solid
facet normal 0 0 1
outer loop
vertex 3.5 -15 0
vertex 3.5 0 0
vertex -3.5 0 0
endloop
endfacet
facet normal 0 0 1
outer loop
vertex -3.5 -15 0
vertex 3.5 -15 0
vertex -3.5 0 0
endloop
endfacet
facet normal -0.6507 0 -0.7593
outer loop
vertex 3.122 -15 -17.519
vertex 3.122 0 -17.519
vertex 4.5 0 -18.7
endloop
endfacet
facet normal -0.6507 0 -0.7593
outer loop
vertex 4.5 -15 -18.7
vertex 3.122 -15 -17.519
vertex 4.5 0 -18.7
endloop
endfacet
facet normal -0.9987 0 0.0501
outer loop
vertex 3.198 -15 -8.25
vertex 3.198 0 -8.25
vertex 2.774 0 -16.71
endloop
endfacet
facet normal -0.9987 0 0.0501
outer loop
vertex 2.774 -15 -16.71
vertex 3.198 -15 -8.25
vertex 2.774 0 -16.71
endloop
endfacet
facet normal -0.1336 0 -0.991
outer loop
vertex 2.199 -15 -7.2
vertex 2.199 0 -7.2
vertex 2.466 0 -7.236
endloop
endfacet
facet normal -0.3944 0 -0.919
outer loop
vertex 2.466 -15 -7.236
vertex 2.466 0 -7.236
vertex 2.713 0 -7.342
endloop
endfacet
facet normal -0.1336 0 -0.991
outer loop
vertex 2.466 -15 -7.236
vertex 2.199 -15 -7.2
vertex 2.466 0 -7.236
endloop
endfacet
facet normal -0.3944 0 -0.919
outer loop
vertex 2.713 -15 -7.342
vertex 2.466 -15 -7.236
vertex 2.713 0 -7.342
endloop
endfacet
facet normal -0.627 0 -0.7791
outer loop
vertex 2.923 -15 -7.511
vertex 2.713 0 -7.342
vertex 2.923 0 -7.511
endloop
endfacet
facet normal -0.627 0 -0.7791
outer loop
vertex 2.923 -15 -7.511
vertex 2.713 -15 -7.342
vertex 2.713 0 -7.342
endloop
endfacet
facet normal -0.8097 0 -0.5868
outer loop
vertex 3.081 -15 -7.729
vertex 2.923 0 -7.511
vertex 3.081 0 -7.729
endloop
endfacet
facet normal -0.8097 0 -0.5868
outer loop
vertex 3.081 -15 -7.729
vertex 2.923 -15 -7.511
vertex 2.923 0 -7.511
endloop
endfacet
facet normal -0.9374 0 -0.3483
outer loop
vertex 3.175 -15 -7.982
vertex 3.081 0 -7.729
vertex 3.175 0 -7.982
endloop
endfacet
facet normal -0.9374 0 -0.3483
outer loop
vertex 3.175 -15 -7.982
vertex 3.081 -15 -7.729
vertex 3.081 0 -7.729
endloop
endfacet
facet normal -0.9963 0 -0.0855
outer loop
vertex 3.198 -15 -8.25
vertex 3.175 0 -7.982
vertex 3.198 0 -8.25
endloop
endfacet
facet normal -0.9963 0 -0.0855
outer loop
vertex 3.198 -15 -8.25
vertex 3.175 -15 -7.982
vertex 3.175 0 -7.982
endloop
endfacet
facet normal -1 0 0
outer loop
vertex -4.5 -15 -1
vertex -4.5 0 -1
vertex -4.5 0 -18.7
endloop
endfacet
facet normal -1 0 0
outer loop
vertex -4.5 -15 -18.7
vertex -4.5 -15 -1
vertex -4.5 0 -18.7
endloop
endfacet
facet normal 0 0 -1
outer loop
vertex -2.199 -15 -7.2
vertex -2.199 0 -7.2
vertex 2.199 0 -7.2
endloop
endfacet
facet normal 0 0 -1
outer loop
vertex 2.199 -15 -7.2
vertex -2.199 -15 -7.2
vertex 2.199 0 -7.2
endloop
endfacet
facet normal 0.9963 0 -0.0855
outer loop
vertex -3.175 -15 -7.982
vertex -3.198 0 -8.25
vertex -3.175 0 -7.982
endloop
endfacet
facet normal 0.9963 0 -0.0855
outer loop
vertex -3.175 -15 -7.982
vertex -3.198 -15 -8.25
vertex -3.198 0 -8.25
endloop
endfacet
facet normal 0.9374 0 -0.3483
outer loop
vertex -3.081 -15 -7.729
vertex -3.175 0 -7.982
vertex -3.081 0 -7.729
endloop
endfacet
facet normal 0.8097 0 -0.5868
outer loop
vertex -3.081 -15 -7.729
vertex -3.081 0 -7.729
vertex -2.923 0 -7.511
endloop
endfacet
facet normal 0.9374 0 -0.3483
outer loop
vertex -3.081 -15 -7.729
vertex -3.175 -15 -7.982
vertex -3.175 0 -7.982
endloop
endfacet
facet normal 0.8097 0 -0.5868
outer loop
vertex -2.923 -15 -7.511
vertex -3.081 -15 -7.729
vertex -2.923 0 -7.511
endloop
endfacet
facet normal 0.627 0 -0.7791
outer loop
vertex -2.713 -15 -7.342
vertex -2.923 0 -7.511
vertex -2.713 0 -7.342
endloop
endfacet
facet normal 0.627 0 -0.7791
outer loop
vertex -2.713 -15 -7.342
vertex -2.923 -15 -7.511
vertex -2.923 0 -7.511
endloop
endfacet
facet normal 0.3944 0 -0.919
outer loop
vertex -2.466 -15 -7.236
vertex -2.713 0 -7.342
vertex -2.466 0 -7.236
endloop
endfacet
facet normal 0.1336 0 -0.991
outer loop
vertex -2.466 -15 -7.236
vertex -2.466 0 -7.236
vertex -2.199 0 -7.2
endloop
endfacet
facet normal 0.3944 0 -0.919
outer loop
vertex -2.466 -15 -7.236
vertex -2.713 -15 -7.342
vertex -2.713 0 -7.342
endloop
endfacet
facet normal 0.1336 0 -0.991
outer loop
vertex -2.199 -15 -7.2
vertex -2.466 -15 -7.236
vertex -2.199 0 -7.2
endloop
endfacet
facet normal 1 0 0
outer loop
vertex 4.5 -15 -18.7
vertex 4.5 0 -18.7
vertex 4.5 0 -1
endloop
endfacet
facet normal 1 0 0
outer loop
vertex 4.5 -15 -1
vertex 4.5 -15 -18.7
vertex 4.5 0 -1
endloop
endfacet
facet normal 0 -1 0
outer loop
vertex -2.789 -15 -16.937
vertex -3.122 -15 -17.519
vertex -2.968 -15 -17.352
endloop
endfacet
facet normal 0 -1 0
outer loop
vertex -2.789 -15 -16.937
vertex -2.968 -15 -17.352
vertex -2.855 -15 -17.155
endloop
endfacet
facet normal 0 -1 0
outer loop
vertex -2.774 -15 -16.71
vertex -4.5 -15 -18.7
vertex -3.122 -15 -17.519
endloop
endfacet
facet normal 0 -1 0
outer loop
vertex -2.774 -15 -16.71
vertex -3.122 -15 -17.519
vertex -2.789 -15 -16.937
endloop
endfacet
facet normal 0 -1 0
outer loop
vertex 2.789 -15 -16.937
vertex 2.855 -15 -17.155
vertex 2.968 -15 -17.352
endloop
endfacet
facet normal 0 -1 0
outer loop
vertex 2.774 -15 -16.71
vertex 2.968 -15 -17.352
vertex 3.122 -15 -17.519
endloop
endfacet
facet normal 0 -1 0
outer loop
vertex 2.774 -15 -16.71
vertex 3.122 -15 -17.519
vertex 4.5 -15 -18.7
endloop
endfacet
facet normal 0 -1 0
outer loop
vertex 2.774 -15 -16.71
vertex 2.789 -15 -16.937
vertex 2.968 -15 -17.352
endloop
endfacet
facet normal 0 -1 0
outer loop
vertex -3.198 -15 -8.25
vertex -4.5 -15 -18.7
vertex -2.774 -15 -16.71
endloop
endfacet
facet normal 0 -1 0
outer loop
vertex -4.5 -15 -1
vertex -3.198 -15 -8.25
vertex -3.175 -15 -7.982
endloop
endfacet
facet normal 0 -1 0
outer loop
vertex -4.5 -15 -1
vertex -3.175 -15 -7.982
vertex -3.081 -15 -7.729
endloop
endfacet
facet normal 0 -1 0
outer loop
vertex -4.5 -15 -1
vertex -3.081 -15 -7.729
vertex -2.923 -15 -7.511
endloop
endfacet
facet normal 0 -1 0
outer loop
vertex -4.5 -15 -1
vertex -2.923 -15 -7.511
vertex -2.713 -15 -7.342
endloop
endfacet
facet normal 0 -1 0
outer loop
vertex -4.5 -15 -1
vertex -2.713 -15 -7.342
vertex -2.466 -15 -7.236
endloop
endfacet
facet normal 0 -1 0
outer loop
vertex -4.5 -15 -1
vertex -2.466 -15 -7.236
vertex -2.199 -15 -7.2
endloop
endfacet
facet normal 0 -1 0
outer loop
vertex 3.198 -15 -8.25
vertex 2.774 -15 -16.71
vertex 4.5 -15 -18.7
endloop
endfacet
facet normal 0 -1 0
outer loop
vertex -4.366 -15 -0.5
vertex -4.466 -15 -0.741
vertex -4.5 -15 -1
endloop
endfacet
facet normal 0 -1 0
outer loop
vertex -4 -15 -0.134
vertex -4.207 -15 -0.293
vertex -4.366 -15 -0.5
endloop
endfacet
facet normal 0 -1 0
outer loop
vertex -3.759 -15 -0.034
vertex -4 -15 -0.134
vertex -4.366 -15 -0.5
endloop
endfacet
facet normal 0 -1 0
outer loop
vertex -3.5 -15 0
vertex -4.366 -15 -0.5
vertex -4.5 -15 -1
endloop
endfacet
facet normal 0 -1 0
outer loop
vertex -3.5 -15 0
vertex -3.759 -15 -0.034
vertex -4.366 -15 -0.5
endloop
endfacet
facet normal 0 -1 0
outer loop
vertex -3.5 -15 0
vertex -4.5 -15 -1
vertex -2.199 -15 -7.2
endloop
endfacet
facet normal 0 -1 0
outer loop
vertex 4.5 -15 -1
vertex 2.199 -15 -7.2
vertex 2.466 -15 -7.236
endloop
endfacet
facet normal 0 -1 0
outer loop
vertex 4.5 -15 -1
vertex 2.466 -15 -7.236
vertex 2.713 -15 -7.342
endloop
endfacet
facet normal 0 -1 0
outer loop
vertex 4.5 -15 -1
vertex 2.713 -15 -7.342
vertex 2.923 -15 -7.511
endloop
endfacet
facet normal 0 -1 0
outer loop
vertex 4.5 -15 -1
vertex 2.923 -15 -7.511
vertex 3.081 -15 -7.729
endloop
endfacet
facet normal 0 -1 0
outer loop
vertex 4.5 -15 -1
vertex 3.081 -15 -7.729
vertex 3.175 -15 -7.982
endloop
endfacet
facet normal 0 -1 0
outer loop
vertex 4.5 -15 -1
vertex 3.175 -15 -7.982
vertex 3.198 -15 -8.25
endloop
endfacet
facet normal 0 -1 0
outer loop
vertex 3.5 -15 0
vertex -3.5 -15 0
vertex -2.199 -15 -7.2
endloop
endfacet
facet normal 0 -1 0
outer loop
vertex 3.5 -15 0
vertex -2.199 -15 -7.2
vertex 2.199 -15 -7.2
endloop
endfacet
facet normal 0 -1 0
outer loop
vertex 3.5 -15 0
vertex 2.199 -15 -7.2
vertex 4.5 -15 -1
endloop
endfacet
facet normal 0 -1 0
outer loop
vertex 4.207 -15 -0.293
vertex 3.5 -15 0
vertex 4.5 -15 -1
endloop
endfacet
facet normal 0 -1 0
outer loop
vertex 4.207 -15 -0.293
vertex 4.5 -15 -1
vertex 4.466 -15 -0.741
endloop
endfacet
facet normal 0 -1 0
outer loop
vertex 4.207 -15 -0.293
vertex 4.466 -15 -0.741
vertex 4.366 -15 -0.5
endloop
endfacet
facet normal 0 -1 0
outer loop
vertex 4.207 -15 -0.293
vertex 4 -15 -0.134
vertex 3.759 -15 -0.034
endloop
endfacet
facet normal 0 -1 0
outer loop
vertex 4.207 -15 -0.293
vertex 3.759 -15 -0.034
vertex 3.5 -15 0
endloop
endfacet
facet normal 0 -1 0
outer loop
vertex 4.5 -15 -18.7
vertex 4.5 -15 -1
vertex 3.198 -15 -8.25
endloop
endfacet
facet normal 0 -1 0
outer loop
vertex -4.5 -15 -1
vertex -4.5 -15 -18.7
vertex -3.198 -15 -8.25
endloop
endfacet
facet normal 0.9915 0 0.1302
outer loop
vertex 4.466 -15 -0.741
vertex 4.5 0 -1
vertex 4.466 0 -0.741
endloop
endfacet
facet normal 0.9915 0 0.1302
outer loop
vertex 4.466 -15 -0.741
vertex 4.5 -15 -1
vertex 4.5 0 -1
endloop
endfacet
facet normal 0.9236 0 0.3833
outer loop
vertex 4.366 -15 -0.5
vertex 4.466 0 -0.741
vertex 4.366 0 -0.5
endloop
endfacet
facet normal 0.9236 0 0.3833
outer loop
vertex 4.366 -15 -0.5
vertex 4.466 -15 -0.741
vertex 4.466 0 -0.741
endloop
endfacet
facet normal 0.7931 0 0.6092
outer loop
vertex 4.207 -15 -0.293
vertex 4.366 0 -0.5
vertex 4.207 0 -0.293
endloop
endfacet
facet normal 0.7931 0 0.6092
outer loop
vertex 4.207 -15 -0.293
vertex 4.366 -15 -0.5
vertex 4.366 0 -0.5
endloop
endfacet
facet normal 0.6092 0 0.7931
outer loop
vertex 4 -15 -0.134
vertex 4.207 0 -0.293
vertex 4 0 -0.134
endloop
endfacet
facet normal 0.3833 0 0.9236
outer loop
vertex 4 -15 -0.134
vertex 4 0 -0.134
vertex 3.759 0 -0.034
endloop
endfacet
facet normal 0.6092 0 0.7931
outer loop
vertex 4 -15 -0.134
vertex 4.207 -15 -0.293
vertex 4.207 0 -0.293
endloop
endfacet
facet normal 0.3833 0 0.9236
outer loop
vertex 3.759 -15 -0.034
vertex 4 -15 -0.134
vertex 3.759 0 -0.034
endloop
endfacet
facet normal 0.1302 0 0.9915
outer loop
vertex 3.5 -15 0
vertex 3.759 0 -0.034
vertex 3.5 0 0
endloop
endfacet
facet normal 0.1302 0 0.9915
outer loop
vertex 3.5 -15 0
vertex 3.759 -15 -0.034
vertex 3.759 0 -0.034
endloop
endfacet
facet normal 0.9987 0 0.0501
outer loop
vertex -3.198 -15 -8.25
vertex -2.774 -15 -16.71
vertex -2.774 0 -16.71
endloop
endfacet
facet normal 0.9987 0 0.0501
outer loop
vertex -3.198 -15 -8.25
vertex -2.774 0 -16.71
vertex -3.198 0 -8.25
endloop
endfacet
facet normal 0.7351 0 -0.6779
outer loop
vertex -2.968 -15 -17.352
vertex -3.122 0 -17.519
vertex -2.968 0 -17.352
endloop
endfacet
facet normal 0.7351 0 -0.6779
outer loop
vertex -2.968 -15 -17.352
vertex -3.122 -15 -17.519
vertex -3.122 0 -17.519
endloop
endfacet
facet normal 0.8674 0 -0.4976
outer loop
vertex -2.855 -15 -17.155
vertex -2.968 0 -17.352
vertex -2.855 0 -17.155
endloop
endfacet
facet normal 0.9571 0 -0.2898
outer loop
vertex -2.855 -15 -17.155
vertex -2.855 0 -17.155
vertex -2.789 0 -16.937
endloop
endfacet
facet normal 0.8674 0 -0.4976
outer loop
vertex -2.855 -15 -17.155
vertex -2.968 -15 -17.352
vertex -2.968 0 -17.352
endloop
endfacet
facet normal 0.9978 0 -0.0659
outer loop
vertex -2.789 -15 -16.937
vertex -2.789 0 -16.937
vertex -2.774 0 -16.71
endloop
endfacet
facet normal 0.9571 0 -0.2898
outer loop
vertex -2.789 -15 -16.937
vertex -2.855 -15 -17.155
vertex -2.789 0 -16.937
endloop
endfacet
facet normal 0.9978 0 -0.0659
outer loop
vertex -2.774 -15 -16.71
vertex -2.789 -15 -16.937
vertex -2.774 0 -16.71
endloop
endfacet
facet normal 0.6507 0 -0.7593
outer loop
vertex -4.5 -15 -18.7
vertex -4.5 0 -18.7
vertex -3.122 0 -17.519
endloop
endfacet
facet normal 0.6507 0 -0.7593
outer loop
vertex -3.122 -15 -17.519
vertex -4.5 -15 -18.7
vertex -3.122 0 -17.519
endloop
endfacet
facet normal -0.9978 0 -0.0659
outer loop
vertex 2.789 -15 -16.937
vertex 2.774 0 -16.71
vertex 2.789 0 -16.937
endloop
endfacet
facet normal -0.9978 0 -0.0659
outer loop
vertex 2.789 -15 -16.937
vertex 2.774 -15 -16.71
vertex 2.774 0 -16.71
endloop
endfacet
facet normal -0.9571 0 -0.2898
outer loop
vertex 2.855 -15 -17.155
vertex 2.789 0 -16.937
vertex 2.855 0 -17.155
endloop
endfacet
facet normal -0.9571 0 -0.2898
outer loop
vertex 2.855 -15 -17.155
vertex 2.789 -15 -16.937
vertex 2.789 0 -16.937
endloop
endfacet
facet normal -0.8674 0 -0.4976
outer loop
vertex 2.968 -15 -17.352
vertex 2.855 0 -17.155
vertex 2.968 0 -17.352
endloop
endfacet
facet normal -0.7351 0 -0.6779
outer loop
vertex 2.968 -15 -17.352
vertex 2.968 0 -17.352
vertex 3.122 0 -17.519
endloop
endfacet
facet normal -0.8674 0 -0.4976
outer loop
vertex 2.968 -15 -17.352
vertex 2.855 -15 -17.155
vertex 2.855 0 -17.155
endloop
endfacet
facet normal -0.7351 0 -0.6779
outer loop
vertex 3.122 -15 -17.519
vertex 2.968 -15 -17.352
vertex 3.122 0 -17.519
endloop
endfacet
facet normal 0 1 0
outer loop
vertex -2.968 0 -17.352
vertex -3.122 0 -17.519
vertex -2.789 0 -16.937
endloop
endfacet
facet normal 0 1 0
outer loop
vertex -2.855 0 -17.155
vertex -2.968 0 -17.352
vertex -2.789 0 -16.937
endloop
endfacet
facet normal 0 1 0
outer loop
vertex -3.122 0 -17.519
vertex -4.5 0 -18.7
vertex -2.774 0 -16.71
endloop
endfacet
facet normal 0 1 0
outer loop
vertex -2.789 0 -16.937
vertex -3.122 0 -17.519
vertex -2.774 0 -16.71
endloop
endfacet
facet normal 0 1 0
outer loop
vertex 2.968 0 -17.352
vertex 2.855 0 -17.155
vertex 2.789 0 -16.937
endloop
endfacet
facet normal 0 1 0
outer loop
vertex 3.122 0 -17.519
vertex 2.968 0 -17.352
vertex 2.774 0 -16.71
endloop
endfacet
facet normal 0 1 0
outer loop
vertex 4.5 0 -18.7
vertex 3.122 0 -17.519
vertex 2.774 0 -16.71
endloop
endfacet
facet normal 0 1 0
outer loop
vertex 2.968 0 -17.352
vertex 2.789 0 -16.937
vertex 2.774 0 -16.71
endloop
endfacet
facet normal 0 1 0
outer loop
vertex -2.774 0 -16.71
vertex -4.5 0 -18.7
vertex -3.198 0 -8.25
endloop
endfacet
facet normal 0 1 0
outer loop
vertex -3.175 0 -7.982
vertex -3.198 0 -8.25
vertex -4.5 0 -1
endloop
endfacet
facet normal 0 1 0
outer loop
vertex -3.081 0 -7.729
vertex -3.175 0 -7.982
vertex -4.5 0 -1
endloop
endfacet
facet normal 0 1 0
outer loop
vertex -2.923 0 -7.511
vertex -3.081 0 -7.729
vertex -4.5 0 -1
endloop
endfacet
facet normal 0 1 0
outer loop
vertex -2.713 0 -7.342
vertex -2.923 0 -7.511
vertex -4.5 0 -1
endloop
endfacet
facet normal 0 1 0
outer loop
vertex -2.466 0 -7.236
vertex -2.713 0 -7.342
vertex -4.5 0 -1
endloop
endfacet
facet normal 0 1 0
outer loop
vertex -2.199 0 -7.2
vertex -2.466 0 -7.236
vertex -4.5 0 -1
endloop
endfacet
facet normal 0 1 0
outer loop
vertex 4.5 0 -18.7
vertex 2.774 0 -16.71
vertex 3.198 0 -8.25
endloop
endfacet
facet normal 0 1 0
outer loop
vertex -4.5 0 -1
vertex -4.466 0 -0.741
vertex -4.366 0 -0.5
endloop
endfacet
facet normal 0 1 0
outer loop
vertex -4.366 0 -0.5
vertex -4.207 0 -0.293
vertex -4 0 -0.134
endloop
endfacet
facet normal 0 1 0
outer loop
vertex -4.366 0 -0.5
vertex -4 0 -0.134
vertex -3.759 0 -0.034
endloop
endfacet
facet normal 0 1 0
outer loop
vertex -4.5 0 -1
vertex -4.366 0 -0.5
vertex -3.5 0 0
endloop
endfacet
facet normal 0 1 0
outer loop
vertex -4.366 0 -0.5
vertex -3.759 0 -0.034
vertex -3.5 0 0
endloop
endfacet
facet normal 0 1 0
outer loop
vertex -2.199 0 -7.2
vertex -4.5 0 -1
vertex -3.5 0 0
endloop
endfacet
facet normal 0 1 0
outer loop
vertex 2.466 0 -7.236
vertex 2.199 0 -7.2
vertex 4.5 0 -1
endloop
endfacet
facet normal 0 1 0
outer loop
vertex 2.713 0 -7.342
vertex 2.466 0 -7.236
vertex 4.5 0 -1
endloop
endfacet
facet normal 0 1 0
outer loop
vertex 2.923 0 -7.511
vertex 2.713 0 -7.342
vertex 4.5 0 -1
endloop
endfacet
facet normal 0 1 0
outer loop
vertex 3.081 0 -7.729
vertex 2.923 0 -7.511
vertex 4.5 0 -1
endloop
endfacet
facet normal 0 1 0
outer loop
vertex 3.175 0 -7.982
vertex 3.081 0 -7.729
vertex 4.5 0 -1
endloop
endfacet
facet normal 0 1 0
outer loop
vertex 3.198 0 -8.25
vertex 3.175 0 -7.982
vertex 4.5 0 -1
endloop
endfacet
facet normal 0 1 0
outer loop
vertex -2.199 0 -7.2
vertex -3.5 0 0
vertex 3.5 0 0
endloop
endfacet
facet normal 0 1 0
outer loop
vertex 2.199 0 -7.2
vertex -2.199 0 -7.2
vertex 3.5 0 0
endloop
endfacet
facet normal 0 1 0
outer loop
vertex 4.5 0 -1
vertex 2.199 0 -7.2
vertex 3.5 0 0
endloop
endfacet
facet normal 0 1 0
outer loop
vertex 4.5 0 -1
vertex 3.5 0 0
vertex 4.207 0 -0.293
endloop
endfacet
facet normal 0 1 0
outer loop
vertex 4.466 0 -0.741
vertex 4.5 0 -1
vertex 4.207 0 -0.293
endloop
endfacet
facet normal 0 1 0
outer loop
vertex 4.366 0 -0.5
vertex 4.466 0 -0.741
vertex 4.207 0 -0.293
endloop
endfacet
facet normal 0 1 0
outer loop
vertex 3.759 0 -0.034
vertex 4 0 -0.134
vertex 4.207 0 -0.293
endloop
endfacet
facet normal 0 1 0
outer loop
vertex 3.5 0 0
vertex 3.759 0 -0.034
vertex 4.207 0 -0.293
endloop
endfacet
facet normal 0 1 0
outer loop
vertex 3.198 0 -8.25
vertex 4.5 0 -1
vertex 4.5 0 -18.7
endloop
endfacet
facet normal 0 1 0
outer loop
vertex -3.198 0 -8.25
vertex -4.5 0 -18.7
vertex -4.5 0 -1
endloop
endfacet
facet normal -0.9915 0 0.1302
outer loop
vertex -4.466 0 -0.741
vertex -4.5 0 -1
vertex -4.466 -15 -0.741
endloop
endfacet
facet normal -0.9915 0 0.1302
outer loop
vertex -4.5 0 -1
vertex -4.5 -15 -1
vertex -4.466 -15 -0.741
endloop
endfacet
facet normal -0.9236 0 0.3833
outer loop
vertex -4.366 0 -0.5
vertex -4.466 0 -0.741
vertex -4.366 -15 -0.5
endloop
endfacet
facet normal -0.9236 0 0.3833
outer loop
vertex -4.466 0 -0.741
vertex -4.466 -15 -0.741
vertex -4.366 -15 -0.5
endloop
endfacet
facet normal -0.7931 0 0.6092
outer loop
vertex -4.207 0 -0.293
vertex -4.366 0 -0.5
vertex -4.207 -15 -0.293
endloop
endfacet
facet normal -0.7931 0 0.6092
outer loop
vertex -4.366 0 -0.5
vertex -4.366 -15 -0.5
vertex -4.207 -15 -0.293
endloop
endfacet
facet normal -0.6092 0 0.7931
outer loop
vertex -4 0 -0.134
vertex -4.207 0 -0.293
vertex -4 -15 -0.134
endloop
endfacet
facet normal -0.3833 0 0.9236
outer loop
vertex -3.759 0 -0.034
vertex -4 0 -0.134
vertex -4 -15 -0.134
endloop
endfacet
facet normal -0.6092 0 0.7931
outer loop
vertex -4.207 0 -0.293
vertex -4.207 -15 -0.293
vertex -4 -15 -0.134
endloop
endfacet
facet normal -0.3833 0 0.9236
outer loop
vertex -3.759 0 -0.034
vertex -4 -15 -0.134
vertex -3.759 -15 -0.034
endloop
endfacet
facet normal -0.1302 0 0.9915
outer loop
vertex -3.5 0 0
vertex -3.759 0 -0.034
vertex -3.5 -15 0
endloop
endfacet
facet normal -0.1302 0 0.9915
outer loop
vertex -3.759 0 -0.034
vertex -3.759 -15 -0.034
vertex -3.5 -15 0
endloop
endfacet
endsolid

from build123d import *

# Parameters (mm, degrees)
F1_DEPTH = 15
F2_R     = 1
F3_R     = 1


with BuildPart() as f1:
    # F0 (on Front) → F1 (new body)
    with BuildSketch(Plane.XZ):
        Polygon((-4.5, 0), (-4.5, -18.7), (-2.75, -17.2), (-3.25, -7.2), (3.25, -7.2), (2.75, -17.2), (4.5, -18.7), (4.5, -1), (4.5, 0), align=None)
    extrude(amount=F1_DEPTH)

    # F2
    f2_edges = [f1.edges().sort_by_distance(p)[0] for p in [
        (-2.75, -7.5, -17.2),
        (-4.5, -7.5, 0),
        (4.5, -7.5, 0),
        (2.75, -7.5, -17.2),
    ]]
    fillet(f2_edges, radius=F2_R)

    # F3
    f3_edges = [f1.edges().sort_by_distance(p)[0] for p in [
        (-3.25, -7.5, -7.2),
        (3.25, -7.5, -7.2),
    ]]
    fillet(f3_edges, radius=F3_R)


solid = f1.part
